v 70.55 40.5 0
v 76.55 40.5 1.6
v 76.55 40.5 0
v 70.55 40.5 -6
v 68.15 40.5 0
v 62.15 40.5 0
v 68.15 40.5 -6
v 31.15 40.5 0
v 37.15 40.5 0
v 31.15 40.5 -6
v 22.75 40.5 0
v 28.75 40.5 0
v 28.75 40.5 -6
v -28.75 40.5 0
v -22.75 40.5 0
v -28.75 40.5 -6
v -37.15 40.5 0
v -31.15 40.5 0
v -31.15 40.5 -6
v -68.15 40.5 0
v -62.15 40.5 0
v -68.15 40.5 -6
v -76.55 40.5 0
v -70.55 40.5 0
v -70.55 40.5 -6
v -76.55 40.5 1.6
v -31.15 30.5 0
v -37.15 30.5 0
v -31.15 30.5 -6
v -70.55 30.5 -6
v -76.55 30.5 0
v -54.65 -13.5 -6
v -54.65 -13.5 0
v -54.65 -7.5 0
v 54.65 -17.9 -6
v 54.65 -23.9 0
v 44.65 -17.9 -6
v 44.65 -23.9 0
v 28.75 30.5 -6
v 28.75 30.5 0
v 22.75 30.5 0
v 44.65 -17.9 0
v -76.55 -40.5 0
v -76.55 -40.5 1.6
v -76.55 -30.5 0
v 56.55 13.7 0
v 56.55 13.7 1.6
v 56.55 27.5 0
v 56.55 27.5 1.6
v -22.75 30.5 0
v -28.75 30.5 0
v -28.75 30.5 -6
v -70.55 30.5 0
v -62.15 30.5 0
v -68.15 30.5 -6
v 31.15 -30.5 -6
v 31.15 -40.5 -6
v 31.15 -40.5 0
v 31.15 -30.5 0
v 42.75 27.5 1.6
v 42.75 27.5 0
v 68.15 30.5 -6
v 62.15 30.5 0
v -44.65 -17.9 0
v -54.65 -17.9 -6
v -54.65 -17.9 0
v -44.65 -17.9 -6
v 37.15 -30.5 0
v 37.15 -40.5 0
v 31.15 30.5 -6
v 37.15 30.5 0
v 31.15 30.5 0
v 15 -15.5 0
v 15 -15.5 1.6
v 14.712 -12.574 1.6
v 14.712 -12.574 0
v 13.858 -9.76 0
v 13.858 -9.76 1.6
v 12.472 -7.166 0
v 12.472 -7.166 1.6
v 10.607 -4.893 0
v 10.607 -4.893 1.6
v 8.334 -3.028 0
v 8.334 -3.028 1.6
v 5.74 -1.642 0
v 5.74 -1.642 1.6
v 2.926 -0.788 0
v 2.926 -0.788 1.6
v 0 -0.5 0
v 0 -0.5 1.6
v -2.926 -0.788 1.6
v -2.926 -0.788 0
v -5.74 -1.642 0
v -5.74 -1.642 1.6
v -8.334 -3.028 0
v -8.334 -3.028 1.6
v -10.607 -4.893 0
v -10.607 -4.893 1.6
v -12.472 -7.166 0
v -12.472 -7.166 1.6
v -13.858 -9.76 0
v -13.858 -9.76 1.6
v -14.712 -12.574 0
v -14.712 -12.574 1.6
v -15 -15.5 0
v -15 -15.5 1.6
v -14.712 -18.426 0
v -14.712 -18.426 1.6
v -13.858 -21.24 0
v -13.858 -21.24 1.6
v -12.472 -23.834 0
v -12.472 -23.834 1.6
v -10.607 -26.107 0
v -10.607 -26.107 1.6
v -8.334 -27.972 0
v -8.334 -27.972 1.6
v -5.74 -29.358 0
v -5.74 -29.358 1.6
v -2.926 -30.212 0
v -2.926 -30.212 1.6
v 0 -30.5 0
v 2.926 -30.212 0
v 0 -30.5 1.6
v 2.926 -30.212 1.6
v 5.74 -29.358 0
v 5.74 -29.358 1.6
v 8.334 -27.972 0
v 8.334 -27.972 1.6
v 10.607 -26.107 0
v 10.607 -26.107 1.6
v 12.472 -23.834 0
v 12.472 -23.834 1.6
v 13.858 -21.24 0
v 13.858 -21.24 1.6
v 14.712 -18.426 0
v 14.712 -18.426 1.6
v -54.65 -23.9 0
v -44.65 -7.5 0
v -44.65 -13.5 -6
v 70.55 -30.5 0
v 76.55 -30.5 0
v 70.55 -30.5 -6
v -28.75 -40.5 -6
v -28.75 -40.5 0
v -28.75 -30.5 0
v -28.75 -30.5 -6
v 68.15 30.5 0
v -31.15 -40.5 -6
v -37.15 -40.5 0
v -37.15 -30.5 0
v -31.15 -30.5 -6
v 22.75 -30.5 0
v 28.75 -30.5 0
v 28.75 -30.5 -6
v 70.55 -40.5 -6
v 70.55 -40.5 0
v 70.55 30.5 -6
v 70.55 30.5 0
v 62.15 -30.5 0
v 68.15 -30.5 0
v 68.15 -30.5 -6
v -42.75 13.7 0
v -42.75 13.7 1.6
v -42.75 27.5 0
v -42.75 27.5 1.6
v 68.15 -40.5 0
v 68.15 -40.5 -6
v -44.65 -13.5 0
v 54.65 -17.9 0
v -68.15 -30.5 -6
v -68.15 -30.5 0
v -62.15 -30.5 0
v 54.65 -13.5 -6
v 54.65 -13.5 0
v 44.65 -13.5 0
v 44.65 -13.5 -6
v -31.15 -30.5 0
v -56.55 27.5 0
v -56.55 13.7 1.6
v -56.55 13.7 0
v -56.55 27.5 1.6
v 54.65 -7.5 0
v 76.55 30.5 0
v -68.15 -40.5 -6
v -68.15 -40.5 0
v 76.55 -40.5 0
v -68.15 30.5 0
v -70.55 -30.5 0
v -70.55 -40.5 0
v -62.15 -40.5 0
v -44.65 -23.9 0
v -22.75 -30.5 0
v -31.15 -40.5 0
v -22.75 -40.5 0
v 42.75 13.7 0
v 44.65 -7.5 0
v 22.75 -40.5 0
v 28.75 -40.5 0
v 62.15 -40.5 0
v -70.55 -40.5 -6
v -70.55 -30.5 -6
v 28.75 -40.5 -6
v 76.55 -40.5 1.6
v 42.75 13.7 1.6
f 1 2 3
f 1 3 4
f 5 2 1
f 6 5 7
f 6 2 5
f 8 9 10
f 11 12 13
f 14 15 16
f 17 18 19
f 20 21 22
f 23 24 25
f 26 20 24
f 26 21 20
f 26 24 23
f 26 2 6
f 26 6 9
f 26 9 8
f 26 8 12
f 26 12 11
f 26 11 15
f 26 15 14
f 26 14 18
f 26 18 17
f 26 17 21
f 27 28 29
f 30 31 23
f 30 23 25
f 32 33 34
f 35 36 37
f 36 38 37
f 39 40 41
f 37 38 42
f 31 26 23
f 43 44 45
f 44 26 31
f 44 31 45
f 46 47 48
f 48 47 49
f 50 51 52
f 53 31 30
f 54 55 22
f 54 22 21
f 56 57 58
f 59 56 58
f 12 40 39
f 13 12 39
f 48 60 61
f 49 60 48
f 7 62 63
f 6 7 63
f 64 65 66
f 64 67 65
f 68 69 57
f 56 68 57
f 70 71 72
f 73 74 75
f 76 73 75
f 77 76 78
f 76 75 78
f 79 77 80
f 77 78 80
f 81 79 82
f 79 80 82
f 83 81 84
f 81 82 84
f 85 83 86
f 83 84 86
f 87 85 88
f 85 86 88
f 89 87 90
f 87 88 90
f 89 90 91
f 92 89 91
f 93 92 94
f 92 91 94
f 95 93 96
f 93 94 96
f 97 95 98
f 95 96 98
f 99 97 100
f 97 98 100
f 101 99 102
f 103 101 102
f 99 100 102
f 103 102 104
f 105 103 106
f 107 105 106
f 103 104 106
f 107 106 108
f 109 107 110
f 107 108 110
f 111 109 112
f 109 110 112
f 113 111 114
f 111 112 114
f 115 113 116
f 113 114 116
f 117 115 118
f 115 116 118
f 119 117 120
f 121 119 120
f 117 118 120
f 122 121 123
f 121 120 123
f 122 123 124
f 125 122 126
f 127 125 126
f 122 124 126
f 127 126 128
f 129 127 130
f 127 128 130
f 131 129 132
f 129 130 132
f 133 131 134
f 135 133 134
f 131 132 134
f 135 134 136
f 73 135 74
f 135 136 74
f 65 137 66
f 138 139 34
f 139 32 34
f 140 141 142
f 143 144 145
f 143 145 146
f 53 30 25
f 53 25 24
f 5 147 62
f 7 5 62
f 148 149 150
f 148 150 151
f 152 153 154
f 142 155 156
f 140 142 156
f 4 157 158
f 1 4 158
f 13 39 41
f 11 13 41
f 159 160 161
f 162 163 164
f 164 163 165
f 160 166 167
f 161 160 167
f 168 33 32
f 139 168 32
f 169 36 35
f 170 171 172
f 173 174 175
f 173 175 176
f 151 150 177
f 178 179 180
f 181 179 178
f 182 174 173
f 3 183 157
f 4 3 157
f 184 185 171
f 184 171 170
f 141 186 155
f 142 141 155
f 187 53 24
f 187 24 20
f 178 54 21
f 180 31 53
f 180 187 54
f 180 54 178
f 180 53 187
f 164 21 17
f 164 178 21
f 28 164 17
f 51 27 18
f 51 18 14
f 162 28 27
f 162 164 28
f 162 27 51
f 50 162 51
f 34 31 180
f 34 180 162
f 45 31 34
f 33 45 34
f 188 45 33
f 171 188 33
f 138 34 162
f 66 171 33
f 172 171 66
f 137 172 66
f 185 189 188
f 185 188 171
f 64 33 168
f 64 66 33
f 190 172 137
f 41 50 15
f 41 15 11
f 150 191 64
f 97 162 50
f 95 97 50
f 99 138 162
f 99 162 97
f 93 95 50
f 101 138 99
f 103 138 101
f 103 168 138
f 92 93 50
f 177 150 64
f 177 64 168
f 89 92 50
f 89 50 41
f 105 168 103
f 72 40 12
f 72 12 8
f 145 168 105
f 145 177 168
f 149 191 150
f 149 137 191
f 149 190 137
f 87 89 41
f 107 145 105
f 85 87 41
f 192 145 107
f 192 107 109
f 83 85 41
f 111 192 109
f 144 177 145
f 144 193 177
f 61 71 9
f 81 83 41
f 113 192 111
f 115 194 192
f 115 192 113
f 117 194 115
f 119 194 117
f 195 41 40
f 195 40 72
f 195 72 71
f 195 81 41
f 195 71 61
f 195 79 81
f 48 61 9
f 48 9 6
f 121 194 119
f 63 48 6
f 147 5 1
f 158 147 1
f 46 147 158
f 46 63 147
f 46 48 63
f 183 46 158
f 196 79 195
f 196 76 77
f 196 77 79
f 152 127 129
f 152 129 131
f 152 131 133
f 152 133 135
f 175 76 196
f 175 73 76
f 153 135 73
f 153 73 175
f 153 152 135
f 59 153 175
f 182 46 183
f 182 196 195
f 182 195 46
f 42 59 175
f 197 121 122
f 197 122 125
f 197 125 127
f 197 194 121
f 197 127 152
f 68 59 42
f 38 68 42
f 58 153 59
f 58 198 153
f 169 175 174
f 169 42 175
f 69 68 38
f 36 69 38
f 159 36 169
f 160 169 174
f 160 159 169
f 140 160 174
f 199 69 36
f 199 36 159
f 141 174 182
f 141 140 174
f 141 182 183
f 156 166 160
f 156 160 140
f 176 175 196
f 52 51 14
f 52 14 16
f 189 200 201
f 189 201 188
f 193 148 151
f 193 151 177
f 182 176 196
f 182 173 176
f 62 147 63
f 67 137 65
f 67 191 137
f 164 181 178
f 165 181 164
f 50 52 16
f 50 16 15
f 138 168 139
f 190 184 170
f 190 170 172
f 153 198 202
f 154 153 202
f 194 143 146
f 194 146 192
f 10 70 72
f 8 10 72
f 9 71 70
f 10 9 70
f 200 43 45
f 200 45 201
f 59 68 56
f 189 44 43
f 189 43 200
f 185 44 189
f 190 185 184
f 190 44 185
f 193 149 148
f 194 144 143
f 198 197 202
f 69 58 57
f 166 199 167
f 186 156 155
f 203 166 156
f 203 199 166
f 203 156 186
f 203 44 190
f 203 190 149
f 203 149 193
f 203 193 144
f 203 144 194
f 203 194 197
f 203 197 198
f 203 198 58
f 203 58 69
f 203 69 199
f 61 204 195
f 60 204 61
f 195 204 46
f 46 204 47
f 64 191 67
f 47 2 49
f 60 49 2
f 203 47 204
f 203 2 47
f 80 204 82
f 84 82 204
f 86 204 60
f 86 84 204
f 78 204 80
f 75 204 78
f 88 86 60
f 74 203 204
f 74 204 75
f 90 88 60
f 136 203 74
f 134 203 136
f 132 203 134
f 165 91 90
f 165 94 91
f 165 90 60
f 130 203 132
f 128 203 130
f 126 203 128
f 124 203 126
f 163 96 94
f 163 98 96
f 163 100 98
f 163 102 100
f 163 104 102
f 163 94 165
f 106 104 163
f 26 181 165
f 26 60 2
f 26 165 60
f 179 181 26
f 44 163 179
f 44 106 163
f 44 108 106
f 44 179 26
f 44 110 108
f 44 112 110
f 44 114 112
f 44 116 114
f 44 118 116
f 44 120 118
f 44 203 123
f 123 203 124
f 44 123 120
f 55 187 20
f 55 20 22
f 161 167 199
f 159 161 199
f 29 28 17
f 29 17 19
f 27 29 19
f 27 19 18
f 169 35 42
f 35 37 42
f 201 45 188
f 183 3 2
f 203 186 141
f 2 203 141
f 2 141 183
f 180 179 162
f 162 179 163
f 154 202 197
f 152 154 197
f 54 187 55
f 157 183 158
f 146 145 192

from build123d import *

# Parameters (mm, degrees)
F2_DEPTH  = 81
F3_DEPTH  = 10
F4_START  = -71
F4_DEPTH  = 10
F7_DEPTH  = 5
F9_R      = 15
F10_DEPTH = 1.6
F11_W     = 13.8
F11_H     = 13.8
F12_DEPTH = 1.6


# Not quite as in the source:
# - a feature names something its author has since deleted; it is built from what else it names


with BuildPart() as f2:
    # F1 (on offset) → F2 (new body)
    with BuildSketch(Plane.XZ.offset(40.5)):
        Polygon((76.55, 0), (76.55, 1.6), (-76.55, 1.6), (-76.55, 0), (-70.55, 0), (-68.15, 0), (-62.15, 0), (-37.15, 0), (-31.15, 0), (-28.75, 0), (-22.75, 0), (22.75, 0), (28.75, 0), (31.15, 0), (37.15, 0), (62.15, 0), (68.15, 0), (70.55, 0), align=None)
    extrude(amount=-F2_DEPTH)

    # F1 (on offset) → F3 (join)
    with BuildSketch(Plane.XZ.offset(40.5)):
        Polygon((-62.15, 0), (-68.15, 0), (-68.15, -6), align=None)
        Polygon((-31.15, 0), (-37.15, 0), (-31.15, -6), align=None)
        Polygon((-22.75, 0), (-28.75, 0), (-28.75, -6), align=None)
        Polygon((-70.55, 0), (-76.55, 0), (-70.55, -6), align=None)
    extrude(amount=-F3_DEPTH)

    # F1 (on offset) → F4 (join)
    with BuildSketch(Plane.XZ.offset(40.5).offset(F4_START)):
        Polygon((-62.15, 0), (-68.15, 0), (-68.15, -6), align=None)
        Polygon((-31.15, 0), (-37.15, 0), (-31.15, -6), align=None)
        Polygon((-22.75, 0), (-28.75, 0), (-28.75, -6), align=None)
        Polygon((-70.55, 0), (-76.55, 0), (-70.55, -6), align=None)
    extrude(amount=-F4_DEPTH)

    # F6 (on offset) → F7 (join, symmetric)
    with BuildSketch(Plane.YZ.offset(-49.65)):
        Polygon((-13.5, 0), (-13.5, -6), (-7.5, 0), align=None)
        Polygon((-17.9, -6), (-17.9, 0), (-23.9, 0), align=None)
    extrude(amount=F7_DEPTH, both=True)

    # F8: F2 across plane


with BuildPart() as f2_1:
    add(f2.part)
    add(f2.part.mirror(Plane.YZ))

    # F9 (on face) → F10 (cut)
    with BuildSketch(Plane.XY.offset(1.6)):
        with Locations((0, -15.5)):
            Circle(F9_R)
    extrude(amount=-F10_DEPTH, mode=Mode.SUBTRACT)

    # F11 (on face) → F12 (cut)
    with BuildSketch(Plane.XY.offset(1.6)):
        with Locations((-49.65, 20.6)):
            Rectangle(F11_W, F11_H)
        with Locations((49.65, 20.6)):
            Rectangle(F11_W, F11_H)
    extrude(amount=-F12_DEPTH, mode=Mode.SUBTRACT)


solid = f2_1.part
